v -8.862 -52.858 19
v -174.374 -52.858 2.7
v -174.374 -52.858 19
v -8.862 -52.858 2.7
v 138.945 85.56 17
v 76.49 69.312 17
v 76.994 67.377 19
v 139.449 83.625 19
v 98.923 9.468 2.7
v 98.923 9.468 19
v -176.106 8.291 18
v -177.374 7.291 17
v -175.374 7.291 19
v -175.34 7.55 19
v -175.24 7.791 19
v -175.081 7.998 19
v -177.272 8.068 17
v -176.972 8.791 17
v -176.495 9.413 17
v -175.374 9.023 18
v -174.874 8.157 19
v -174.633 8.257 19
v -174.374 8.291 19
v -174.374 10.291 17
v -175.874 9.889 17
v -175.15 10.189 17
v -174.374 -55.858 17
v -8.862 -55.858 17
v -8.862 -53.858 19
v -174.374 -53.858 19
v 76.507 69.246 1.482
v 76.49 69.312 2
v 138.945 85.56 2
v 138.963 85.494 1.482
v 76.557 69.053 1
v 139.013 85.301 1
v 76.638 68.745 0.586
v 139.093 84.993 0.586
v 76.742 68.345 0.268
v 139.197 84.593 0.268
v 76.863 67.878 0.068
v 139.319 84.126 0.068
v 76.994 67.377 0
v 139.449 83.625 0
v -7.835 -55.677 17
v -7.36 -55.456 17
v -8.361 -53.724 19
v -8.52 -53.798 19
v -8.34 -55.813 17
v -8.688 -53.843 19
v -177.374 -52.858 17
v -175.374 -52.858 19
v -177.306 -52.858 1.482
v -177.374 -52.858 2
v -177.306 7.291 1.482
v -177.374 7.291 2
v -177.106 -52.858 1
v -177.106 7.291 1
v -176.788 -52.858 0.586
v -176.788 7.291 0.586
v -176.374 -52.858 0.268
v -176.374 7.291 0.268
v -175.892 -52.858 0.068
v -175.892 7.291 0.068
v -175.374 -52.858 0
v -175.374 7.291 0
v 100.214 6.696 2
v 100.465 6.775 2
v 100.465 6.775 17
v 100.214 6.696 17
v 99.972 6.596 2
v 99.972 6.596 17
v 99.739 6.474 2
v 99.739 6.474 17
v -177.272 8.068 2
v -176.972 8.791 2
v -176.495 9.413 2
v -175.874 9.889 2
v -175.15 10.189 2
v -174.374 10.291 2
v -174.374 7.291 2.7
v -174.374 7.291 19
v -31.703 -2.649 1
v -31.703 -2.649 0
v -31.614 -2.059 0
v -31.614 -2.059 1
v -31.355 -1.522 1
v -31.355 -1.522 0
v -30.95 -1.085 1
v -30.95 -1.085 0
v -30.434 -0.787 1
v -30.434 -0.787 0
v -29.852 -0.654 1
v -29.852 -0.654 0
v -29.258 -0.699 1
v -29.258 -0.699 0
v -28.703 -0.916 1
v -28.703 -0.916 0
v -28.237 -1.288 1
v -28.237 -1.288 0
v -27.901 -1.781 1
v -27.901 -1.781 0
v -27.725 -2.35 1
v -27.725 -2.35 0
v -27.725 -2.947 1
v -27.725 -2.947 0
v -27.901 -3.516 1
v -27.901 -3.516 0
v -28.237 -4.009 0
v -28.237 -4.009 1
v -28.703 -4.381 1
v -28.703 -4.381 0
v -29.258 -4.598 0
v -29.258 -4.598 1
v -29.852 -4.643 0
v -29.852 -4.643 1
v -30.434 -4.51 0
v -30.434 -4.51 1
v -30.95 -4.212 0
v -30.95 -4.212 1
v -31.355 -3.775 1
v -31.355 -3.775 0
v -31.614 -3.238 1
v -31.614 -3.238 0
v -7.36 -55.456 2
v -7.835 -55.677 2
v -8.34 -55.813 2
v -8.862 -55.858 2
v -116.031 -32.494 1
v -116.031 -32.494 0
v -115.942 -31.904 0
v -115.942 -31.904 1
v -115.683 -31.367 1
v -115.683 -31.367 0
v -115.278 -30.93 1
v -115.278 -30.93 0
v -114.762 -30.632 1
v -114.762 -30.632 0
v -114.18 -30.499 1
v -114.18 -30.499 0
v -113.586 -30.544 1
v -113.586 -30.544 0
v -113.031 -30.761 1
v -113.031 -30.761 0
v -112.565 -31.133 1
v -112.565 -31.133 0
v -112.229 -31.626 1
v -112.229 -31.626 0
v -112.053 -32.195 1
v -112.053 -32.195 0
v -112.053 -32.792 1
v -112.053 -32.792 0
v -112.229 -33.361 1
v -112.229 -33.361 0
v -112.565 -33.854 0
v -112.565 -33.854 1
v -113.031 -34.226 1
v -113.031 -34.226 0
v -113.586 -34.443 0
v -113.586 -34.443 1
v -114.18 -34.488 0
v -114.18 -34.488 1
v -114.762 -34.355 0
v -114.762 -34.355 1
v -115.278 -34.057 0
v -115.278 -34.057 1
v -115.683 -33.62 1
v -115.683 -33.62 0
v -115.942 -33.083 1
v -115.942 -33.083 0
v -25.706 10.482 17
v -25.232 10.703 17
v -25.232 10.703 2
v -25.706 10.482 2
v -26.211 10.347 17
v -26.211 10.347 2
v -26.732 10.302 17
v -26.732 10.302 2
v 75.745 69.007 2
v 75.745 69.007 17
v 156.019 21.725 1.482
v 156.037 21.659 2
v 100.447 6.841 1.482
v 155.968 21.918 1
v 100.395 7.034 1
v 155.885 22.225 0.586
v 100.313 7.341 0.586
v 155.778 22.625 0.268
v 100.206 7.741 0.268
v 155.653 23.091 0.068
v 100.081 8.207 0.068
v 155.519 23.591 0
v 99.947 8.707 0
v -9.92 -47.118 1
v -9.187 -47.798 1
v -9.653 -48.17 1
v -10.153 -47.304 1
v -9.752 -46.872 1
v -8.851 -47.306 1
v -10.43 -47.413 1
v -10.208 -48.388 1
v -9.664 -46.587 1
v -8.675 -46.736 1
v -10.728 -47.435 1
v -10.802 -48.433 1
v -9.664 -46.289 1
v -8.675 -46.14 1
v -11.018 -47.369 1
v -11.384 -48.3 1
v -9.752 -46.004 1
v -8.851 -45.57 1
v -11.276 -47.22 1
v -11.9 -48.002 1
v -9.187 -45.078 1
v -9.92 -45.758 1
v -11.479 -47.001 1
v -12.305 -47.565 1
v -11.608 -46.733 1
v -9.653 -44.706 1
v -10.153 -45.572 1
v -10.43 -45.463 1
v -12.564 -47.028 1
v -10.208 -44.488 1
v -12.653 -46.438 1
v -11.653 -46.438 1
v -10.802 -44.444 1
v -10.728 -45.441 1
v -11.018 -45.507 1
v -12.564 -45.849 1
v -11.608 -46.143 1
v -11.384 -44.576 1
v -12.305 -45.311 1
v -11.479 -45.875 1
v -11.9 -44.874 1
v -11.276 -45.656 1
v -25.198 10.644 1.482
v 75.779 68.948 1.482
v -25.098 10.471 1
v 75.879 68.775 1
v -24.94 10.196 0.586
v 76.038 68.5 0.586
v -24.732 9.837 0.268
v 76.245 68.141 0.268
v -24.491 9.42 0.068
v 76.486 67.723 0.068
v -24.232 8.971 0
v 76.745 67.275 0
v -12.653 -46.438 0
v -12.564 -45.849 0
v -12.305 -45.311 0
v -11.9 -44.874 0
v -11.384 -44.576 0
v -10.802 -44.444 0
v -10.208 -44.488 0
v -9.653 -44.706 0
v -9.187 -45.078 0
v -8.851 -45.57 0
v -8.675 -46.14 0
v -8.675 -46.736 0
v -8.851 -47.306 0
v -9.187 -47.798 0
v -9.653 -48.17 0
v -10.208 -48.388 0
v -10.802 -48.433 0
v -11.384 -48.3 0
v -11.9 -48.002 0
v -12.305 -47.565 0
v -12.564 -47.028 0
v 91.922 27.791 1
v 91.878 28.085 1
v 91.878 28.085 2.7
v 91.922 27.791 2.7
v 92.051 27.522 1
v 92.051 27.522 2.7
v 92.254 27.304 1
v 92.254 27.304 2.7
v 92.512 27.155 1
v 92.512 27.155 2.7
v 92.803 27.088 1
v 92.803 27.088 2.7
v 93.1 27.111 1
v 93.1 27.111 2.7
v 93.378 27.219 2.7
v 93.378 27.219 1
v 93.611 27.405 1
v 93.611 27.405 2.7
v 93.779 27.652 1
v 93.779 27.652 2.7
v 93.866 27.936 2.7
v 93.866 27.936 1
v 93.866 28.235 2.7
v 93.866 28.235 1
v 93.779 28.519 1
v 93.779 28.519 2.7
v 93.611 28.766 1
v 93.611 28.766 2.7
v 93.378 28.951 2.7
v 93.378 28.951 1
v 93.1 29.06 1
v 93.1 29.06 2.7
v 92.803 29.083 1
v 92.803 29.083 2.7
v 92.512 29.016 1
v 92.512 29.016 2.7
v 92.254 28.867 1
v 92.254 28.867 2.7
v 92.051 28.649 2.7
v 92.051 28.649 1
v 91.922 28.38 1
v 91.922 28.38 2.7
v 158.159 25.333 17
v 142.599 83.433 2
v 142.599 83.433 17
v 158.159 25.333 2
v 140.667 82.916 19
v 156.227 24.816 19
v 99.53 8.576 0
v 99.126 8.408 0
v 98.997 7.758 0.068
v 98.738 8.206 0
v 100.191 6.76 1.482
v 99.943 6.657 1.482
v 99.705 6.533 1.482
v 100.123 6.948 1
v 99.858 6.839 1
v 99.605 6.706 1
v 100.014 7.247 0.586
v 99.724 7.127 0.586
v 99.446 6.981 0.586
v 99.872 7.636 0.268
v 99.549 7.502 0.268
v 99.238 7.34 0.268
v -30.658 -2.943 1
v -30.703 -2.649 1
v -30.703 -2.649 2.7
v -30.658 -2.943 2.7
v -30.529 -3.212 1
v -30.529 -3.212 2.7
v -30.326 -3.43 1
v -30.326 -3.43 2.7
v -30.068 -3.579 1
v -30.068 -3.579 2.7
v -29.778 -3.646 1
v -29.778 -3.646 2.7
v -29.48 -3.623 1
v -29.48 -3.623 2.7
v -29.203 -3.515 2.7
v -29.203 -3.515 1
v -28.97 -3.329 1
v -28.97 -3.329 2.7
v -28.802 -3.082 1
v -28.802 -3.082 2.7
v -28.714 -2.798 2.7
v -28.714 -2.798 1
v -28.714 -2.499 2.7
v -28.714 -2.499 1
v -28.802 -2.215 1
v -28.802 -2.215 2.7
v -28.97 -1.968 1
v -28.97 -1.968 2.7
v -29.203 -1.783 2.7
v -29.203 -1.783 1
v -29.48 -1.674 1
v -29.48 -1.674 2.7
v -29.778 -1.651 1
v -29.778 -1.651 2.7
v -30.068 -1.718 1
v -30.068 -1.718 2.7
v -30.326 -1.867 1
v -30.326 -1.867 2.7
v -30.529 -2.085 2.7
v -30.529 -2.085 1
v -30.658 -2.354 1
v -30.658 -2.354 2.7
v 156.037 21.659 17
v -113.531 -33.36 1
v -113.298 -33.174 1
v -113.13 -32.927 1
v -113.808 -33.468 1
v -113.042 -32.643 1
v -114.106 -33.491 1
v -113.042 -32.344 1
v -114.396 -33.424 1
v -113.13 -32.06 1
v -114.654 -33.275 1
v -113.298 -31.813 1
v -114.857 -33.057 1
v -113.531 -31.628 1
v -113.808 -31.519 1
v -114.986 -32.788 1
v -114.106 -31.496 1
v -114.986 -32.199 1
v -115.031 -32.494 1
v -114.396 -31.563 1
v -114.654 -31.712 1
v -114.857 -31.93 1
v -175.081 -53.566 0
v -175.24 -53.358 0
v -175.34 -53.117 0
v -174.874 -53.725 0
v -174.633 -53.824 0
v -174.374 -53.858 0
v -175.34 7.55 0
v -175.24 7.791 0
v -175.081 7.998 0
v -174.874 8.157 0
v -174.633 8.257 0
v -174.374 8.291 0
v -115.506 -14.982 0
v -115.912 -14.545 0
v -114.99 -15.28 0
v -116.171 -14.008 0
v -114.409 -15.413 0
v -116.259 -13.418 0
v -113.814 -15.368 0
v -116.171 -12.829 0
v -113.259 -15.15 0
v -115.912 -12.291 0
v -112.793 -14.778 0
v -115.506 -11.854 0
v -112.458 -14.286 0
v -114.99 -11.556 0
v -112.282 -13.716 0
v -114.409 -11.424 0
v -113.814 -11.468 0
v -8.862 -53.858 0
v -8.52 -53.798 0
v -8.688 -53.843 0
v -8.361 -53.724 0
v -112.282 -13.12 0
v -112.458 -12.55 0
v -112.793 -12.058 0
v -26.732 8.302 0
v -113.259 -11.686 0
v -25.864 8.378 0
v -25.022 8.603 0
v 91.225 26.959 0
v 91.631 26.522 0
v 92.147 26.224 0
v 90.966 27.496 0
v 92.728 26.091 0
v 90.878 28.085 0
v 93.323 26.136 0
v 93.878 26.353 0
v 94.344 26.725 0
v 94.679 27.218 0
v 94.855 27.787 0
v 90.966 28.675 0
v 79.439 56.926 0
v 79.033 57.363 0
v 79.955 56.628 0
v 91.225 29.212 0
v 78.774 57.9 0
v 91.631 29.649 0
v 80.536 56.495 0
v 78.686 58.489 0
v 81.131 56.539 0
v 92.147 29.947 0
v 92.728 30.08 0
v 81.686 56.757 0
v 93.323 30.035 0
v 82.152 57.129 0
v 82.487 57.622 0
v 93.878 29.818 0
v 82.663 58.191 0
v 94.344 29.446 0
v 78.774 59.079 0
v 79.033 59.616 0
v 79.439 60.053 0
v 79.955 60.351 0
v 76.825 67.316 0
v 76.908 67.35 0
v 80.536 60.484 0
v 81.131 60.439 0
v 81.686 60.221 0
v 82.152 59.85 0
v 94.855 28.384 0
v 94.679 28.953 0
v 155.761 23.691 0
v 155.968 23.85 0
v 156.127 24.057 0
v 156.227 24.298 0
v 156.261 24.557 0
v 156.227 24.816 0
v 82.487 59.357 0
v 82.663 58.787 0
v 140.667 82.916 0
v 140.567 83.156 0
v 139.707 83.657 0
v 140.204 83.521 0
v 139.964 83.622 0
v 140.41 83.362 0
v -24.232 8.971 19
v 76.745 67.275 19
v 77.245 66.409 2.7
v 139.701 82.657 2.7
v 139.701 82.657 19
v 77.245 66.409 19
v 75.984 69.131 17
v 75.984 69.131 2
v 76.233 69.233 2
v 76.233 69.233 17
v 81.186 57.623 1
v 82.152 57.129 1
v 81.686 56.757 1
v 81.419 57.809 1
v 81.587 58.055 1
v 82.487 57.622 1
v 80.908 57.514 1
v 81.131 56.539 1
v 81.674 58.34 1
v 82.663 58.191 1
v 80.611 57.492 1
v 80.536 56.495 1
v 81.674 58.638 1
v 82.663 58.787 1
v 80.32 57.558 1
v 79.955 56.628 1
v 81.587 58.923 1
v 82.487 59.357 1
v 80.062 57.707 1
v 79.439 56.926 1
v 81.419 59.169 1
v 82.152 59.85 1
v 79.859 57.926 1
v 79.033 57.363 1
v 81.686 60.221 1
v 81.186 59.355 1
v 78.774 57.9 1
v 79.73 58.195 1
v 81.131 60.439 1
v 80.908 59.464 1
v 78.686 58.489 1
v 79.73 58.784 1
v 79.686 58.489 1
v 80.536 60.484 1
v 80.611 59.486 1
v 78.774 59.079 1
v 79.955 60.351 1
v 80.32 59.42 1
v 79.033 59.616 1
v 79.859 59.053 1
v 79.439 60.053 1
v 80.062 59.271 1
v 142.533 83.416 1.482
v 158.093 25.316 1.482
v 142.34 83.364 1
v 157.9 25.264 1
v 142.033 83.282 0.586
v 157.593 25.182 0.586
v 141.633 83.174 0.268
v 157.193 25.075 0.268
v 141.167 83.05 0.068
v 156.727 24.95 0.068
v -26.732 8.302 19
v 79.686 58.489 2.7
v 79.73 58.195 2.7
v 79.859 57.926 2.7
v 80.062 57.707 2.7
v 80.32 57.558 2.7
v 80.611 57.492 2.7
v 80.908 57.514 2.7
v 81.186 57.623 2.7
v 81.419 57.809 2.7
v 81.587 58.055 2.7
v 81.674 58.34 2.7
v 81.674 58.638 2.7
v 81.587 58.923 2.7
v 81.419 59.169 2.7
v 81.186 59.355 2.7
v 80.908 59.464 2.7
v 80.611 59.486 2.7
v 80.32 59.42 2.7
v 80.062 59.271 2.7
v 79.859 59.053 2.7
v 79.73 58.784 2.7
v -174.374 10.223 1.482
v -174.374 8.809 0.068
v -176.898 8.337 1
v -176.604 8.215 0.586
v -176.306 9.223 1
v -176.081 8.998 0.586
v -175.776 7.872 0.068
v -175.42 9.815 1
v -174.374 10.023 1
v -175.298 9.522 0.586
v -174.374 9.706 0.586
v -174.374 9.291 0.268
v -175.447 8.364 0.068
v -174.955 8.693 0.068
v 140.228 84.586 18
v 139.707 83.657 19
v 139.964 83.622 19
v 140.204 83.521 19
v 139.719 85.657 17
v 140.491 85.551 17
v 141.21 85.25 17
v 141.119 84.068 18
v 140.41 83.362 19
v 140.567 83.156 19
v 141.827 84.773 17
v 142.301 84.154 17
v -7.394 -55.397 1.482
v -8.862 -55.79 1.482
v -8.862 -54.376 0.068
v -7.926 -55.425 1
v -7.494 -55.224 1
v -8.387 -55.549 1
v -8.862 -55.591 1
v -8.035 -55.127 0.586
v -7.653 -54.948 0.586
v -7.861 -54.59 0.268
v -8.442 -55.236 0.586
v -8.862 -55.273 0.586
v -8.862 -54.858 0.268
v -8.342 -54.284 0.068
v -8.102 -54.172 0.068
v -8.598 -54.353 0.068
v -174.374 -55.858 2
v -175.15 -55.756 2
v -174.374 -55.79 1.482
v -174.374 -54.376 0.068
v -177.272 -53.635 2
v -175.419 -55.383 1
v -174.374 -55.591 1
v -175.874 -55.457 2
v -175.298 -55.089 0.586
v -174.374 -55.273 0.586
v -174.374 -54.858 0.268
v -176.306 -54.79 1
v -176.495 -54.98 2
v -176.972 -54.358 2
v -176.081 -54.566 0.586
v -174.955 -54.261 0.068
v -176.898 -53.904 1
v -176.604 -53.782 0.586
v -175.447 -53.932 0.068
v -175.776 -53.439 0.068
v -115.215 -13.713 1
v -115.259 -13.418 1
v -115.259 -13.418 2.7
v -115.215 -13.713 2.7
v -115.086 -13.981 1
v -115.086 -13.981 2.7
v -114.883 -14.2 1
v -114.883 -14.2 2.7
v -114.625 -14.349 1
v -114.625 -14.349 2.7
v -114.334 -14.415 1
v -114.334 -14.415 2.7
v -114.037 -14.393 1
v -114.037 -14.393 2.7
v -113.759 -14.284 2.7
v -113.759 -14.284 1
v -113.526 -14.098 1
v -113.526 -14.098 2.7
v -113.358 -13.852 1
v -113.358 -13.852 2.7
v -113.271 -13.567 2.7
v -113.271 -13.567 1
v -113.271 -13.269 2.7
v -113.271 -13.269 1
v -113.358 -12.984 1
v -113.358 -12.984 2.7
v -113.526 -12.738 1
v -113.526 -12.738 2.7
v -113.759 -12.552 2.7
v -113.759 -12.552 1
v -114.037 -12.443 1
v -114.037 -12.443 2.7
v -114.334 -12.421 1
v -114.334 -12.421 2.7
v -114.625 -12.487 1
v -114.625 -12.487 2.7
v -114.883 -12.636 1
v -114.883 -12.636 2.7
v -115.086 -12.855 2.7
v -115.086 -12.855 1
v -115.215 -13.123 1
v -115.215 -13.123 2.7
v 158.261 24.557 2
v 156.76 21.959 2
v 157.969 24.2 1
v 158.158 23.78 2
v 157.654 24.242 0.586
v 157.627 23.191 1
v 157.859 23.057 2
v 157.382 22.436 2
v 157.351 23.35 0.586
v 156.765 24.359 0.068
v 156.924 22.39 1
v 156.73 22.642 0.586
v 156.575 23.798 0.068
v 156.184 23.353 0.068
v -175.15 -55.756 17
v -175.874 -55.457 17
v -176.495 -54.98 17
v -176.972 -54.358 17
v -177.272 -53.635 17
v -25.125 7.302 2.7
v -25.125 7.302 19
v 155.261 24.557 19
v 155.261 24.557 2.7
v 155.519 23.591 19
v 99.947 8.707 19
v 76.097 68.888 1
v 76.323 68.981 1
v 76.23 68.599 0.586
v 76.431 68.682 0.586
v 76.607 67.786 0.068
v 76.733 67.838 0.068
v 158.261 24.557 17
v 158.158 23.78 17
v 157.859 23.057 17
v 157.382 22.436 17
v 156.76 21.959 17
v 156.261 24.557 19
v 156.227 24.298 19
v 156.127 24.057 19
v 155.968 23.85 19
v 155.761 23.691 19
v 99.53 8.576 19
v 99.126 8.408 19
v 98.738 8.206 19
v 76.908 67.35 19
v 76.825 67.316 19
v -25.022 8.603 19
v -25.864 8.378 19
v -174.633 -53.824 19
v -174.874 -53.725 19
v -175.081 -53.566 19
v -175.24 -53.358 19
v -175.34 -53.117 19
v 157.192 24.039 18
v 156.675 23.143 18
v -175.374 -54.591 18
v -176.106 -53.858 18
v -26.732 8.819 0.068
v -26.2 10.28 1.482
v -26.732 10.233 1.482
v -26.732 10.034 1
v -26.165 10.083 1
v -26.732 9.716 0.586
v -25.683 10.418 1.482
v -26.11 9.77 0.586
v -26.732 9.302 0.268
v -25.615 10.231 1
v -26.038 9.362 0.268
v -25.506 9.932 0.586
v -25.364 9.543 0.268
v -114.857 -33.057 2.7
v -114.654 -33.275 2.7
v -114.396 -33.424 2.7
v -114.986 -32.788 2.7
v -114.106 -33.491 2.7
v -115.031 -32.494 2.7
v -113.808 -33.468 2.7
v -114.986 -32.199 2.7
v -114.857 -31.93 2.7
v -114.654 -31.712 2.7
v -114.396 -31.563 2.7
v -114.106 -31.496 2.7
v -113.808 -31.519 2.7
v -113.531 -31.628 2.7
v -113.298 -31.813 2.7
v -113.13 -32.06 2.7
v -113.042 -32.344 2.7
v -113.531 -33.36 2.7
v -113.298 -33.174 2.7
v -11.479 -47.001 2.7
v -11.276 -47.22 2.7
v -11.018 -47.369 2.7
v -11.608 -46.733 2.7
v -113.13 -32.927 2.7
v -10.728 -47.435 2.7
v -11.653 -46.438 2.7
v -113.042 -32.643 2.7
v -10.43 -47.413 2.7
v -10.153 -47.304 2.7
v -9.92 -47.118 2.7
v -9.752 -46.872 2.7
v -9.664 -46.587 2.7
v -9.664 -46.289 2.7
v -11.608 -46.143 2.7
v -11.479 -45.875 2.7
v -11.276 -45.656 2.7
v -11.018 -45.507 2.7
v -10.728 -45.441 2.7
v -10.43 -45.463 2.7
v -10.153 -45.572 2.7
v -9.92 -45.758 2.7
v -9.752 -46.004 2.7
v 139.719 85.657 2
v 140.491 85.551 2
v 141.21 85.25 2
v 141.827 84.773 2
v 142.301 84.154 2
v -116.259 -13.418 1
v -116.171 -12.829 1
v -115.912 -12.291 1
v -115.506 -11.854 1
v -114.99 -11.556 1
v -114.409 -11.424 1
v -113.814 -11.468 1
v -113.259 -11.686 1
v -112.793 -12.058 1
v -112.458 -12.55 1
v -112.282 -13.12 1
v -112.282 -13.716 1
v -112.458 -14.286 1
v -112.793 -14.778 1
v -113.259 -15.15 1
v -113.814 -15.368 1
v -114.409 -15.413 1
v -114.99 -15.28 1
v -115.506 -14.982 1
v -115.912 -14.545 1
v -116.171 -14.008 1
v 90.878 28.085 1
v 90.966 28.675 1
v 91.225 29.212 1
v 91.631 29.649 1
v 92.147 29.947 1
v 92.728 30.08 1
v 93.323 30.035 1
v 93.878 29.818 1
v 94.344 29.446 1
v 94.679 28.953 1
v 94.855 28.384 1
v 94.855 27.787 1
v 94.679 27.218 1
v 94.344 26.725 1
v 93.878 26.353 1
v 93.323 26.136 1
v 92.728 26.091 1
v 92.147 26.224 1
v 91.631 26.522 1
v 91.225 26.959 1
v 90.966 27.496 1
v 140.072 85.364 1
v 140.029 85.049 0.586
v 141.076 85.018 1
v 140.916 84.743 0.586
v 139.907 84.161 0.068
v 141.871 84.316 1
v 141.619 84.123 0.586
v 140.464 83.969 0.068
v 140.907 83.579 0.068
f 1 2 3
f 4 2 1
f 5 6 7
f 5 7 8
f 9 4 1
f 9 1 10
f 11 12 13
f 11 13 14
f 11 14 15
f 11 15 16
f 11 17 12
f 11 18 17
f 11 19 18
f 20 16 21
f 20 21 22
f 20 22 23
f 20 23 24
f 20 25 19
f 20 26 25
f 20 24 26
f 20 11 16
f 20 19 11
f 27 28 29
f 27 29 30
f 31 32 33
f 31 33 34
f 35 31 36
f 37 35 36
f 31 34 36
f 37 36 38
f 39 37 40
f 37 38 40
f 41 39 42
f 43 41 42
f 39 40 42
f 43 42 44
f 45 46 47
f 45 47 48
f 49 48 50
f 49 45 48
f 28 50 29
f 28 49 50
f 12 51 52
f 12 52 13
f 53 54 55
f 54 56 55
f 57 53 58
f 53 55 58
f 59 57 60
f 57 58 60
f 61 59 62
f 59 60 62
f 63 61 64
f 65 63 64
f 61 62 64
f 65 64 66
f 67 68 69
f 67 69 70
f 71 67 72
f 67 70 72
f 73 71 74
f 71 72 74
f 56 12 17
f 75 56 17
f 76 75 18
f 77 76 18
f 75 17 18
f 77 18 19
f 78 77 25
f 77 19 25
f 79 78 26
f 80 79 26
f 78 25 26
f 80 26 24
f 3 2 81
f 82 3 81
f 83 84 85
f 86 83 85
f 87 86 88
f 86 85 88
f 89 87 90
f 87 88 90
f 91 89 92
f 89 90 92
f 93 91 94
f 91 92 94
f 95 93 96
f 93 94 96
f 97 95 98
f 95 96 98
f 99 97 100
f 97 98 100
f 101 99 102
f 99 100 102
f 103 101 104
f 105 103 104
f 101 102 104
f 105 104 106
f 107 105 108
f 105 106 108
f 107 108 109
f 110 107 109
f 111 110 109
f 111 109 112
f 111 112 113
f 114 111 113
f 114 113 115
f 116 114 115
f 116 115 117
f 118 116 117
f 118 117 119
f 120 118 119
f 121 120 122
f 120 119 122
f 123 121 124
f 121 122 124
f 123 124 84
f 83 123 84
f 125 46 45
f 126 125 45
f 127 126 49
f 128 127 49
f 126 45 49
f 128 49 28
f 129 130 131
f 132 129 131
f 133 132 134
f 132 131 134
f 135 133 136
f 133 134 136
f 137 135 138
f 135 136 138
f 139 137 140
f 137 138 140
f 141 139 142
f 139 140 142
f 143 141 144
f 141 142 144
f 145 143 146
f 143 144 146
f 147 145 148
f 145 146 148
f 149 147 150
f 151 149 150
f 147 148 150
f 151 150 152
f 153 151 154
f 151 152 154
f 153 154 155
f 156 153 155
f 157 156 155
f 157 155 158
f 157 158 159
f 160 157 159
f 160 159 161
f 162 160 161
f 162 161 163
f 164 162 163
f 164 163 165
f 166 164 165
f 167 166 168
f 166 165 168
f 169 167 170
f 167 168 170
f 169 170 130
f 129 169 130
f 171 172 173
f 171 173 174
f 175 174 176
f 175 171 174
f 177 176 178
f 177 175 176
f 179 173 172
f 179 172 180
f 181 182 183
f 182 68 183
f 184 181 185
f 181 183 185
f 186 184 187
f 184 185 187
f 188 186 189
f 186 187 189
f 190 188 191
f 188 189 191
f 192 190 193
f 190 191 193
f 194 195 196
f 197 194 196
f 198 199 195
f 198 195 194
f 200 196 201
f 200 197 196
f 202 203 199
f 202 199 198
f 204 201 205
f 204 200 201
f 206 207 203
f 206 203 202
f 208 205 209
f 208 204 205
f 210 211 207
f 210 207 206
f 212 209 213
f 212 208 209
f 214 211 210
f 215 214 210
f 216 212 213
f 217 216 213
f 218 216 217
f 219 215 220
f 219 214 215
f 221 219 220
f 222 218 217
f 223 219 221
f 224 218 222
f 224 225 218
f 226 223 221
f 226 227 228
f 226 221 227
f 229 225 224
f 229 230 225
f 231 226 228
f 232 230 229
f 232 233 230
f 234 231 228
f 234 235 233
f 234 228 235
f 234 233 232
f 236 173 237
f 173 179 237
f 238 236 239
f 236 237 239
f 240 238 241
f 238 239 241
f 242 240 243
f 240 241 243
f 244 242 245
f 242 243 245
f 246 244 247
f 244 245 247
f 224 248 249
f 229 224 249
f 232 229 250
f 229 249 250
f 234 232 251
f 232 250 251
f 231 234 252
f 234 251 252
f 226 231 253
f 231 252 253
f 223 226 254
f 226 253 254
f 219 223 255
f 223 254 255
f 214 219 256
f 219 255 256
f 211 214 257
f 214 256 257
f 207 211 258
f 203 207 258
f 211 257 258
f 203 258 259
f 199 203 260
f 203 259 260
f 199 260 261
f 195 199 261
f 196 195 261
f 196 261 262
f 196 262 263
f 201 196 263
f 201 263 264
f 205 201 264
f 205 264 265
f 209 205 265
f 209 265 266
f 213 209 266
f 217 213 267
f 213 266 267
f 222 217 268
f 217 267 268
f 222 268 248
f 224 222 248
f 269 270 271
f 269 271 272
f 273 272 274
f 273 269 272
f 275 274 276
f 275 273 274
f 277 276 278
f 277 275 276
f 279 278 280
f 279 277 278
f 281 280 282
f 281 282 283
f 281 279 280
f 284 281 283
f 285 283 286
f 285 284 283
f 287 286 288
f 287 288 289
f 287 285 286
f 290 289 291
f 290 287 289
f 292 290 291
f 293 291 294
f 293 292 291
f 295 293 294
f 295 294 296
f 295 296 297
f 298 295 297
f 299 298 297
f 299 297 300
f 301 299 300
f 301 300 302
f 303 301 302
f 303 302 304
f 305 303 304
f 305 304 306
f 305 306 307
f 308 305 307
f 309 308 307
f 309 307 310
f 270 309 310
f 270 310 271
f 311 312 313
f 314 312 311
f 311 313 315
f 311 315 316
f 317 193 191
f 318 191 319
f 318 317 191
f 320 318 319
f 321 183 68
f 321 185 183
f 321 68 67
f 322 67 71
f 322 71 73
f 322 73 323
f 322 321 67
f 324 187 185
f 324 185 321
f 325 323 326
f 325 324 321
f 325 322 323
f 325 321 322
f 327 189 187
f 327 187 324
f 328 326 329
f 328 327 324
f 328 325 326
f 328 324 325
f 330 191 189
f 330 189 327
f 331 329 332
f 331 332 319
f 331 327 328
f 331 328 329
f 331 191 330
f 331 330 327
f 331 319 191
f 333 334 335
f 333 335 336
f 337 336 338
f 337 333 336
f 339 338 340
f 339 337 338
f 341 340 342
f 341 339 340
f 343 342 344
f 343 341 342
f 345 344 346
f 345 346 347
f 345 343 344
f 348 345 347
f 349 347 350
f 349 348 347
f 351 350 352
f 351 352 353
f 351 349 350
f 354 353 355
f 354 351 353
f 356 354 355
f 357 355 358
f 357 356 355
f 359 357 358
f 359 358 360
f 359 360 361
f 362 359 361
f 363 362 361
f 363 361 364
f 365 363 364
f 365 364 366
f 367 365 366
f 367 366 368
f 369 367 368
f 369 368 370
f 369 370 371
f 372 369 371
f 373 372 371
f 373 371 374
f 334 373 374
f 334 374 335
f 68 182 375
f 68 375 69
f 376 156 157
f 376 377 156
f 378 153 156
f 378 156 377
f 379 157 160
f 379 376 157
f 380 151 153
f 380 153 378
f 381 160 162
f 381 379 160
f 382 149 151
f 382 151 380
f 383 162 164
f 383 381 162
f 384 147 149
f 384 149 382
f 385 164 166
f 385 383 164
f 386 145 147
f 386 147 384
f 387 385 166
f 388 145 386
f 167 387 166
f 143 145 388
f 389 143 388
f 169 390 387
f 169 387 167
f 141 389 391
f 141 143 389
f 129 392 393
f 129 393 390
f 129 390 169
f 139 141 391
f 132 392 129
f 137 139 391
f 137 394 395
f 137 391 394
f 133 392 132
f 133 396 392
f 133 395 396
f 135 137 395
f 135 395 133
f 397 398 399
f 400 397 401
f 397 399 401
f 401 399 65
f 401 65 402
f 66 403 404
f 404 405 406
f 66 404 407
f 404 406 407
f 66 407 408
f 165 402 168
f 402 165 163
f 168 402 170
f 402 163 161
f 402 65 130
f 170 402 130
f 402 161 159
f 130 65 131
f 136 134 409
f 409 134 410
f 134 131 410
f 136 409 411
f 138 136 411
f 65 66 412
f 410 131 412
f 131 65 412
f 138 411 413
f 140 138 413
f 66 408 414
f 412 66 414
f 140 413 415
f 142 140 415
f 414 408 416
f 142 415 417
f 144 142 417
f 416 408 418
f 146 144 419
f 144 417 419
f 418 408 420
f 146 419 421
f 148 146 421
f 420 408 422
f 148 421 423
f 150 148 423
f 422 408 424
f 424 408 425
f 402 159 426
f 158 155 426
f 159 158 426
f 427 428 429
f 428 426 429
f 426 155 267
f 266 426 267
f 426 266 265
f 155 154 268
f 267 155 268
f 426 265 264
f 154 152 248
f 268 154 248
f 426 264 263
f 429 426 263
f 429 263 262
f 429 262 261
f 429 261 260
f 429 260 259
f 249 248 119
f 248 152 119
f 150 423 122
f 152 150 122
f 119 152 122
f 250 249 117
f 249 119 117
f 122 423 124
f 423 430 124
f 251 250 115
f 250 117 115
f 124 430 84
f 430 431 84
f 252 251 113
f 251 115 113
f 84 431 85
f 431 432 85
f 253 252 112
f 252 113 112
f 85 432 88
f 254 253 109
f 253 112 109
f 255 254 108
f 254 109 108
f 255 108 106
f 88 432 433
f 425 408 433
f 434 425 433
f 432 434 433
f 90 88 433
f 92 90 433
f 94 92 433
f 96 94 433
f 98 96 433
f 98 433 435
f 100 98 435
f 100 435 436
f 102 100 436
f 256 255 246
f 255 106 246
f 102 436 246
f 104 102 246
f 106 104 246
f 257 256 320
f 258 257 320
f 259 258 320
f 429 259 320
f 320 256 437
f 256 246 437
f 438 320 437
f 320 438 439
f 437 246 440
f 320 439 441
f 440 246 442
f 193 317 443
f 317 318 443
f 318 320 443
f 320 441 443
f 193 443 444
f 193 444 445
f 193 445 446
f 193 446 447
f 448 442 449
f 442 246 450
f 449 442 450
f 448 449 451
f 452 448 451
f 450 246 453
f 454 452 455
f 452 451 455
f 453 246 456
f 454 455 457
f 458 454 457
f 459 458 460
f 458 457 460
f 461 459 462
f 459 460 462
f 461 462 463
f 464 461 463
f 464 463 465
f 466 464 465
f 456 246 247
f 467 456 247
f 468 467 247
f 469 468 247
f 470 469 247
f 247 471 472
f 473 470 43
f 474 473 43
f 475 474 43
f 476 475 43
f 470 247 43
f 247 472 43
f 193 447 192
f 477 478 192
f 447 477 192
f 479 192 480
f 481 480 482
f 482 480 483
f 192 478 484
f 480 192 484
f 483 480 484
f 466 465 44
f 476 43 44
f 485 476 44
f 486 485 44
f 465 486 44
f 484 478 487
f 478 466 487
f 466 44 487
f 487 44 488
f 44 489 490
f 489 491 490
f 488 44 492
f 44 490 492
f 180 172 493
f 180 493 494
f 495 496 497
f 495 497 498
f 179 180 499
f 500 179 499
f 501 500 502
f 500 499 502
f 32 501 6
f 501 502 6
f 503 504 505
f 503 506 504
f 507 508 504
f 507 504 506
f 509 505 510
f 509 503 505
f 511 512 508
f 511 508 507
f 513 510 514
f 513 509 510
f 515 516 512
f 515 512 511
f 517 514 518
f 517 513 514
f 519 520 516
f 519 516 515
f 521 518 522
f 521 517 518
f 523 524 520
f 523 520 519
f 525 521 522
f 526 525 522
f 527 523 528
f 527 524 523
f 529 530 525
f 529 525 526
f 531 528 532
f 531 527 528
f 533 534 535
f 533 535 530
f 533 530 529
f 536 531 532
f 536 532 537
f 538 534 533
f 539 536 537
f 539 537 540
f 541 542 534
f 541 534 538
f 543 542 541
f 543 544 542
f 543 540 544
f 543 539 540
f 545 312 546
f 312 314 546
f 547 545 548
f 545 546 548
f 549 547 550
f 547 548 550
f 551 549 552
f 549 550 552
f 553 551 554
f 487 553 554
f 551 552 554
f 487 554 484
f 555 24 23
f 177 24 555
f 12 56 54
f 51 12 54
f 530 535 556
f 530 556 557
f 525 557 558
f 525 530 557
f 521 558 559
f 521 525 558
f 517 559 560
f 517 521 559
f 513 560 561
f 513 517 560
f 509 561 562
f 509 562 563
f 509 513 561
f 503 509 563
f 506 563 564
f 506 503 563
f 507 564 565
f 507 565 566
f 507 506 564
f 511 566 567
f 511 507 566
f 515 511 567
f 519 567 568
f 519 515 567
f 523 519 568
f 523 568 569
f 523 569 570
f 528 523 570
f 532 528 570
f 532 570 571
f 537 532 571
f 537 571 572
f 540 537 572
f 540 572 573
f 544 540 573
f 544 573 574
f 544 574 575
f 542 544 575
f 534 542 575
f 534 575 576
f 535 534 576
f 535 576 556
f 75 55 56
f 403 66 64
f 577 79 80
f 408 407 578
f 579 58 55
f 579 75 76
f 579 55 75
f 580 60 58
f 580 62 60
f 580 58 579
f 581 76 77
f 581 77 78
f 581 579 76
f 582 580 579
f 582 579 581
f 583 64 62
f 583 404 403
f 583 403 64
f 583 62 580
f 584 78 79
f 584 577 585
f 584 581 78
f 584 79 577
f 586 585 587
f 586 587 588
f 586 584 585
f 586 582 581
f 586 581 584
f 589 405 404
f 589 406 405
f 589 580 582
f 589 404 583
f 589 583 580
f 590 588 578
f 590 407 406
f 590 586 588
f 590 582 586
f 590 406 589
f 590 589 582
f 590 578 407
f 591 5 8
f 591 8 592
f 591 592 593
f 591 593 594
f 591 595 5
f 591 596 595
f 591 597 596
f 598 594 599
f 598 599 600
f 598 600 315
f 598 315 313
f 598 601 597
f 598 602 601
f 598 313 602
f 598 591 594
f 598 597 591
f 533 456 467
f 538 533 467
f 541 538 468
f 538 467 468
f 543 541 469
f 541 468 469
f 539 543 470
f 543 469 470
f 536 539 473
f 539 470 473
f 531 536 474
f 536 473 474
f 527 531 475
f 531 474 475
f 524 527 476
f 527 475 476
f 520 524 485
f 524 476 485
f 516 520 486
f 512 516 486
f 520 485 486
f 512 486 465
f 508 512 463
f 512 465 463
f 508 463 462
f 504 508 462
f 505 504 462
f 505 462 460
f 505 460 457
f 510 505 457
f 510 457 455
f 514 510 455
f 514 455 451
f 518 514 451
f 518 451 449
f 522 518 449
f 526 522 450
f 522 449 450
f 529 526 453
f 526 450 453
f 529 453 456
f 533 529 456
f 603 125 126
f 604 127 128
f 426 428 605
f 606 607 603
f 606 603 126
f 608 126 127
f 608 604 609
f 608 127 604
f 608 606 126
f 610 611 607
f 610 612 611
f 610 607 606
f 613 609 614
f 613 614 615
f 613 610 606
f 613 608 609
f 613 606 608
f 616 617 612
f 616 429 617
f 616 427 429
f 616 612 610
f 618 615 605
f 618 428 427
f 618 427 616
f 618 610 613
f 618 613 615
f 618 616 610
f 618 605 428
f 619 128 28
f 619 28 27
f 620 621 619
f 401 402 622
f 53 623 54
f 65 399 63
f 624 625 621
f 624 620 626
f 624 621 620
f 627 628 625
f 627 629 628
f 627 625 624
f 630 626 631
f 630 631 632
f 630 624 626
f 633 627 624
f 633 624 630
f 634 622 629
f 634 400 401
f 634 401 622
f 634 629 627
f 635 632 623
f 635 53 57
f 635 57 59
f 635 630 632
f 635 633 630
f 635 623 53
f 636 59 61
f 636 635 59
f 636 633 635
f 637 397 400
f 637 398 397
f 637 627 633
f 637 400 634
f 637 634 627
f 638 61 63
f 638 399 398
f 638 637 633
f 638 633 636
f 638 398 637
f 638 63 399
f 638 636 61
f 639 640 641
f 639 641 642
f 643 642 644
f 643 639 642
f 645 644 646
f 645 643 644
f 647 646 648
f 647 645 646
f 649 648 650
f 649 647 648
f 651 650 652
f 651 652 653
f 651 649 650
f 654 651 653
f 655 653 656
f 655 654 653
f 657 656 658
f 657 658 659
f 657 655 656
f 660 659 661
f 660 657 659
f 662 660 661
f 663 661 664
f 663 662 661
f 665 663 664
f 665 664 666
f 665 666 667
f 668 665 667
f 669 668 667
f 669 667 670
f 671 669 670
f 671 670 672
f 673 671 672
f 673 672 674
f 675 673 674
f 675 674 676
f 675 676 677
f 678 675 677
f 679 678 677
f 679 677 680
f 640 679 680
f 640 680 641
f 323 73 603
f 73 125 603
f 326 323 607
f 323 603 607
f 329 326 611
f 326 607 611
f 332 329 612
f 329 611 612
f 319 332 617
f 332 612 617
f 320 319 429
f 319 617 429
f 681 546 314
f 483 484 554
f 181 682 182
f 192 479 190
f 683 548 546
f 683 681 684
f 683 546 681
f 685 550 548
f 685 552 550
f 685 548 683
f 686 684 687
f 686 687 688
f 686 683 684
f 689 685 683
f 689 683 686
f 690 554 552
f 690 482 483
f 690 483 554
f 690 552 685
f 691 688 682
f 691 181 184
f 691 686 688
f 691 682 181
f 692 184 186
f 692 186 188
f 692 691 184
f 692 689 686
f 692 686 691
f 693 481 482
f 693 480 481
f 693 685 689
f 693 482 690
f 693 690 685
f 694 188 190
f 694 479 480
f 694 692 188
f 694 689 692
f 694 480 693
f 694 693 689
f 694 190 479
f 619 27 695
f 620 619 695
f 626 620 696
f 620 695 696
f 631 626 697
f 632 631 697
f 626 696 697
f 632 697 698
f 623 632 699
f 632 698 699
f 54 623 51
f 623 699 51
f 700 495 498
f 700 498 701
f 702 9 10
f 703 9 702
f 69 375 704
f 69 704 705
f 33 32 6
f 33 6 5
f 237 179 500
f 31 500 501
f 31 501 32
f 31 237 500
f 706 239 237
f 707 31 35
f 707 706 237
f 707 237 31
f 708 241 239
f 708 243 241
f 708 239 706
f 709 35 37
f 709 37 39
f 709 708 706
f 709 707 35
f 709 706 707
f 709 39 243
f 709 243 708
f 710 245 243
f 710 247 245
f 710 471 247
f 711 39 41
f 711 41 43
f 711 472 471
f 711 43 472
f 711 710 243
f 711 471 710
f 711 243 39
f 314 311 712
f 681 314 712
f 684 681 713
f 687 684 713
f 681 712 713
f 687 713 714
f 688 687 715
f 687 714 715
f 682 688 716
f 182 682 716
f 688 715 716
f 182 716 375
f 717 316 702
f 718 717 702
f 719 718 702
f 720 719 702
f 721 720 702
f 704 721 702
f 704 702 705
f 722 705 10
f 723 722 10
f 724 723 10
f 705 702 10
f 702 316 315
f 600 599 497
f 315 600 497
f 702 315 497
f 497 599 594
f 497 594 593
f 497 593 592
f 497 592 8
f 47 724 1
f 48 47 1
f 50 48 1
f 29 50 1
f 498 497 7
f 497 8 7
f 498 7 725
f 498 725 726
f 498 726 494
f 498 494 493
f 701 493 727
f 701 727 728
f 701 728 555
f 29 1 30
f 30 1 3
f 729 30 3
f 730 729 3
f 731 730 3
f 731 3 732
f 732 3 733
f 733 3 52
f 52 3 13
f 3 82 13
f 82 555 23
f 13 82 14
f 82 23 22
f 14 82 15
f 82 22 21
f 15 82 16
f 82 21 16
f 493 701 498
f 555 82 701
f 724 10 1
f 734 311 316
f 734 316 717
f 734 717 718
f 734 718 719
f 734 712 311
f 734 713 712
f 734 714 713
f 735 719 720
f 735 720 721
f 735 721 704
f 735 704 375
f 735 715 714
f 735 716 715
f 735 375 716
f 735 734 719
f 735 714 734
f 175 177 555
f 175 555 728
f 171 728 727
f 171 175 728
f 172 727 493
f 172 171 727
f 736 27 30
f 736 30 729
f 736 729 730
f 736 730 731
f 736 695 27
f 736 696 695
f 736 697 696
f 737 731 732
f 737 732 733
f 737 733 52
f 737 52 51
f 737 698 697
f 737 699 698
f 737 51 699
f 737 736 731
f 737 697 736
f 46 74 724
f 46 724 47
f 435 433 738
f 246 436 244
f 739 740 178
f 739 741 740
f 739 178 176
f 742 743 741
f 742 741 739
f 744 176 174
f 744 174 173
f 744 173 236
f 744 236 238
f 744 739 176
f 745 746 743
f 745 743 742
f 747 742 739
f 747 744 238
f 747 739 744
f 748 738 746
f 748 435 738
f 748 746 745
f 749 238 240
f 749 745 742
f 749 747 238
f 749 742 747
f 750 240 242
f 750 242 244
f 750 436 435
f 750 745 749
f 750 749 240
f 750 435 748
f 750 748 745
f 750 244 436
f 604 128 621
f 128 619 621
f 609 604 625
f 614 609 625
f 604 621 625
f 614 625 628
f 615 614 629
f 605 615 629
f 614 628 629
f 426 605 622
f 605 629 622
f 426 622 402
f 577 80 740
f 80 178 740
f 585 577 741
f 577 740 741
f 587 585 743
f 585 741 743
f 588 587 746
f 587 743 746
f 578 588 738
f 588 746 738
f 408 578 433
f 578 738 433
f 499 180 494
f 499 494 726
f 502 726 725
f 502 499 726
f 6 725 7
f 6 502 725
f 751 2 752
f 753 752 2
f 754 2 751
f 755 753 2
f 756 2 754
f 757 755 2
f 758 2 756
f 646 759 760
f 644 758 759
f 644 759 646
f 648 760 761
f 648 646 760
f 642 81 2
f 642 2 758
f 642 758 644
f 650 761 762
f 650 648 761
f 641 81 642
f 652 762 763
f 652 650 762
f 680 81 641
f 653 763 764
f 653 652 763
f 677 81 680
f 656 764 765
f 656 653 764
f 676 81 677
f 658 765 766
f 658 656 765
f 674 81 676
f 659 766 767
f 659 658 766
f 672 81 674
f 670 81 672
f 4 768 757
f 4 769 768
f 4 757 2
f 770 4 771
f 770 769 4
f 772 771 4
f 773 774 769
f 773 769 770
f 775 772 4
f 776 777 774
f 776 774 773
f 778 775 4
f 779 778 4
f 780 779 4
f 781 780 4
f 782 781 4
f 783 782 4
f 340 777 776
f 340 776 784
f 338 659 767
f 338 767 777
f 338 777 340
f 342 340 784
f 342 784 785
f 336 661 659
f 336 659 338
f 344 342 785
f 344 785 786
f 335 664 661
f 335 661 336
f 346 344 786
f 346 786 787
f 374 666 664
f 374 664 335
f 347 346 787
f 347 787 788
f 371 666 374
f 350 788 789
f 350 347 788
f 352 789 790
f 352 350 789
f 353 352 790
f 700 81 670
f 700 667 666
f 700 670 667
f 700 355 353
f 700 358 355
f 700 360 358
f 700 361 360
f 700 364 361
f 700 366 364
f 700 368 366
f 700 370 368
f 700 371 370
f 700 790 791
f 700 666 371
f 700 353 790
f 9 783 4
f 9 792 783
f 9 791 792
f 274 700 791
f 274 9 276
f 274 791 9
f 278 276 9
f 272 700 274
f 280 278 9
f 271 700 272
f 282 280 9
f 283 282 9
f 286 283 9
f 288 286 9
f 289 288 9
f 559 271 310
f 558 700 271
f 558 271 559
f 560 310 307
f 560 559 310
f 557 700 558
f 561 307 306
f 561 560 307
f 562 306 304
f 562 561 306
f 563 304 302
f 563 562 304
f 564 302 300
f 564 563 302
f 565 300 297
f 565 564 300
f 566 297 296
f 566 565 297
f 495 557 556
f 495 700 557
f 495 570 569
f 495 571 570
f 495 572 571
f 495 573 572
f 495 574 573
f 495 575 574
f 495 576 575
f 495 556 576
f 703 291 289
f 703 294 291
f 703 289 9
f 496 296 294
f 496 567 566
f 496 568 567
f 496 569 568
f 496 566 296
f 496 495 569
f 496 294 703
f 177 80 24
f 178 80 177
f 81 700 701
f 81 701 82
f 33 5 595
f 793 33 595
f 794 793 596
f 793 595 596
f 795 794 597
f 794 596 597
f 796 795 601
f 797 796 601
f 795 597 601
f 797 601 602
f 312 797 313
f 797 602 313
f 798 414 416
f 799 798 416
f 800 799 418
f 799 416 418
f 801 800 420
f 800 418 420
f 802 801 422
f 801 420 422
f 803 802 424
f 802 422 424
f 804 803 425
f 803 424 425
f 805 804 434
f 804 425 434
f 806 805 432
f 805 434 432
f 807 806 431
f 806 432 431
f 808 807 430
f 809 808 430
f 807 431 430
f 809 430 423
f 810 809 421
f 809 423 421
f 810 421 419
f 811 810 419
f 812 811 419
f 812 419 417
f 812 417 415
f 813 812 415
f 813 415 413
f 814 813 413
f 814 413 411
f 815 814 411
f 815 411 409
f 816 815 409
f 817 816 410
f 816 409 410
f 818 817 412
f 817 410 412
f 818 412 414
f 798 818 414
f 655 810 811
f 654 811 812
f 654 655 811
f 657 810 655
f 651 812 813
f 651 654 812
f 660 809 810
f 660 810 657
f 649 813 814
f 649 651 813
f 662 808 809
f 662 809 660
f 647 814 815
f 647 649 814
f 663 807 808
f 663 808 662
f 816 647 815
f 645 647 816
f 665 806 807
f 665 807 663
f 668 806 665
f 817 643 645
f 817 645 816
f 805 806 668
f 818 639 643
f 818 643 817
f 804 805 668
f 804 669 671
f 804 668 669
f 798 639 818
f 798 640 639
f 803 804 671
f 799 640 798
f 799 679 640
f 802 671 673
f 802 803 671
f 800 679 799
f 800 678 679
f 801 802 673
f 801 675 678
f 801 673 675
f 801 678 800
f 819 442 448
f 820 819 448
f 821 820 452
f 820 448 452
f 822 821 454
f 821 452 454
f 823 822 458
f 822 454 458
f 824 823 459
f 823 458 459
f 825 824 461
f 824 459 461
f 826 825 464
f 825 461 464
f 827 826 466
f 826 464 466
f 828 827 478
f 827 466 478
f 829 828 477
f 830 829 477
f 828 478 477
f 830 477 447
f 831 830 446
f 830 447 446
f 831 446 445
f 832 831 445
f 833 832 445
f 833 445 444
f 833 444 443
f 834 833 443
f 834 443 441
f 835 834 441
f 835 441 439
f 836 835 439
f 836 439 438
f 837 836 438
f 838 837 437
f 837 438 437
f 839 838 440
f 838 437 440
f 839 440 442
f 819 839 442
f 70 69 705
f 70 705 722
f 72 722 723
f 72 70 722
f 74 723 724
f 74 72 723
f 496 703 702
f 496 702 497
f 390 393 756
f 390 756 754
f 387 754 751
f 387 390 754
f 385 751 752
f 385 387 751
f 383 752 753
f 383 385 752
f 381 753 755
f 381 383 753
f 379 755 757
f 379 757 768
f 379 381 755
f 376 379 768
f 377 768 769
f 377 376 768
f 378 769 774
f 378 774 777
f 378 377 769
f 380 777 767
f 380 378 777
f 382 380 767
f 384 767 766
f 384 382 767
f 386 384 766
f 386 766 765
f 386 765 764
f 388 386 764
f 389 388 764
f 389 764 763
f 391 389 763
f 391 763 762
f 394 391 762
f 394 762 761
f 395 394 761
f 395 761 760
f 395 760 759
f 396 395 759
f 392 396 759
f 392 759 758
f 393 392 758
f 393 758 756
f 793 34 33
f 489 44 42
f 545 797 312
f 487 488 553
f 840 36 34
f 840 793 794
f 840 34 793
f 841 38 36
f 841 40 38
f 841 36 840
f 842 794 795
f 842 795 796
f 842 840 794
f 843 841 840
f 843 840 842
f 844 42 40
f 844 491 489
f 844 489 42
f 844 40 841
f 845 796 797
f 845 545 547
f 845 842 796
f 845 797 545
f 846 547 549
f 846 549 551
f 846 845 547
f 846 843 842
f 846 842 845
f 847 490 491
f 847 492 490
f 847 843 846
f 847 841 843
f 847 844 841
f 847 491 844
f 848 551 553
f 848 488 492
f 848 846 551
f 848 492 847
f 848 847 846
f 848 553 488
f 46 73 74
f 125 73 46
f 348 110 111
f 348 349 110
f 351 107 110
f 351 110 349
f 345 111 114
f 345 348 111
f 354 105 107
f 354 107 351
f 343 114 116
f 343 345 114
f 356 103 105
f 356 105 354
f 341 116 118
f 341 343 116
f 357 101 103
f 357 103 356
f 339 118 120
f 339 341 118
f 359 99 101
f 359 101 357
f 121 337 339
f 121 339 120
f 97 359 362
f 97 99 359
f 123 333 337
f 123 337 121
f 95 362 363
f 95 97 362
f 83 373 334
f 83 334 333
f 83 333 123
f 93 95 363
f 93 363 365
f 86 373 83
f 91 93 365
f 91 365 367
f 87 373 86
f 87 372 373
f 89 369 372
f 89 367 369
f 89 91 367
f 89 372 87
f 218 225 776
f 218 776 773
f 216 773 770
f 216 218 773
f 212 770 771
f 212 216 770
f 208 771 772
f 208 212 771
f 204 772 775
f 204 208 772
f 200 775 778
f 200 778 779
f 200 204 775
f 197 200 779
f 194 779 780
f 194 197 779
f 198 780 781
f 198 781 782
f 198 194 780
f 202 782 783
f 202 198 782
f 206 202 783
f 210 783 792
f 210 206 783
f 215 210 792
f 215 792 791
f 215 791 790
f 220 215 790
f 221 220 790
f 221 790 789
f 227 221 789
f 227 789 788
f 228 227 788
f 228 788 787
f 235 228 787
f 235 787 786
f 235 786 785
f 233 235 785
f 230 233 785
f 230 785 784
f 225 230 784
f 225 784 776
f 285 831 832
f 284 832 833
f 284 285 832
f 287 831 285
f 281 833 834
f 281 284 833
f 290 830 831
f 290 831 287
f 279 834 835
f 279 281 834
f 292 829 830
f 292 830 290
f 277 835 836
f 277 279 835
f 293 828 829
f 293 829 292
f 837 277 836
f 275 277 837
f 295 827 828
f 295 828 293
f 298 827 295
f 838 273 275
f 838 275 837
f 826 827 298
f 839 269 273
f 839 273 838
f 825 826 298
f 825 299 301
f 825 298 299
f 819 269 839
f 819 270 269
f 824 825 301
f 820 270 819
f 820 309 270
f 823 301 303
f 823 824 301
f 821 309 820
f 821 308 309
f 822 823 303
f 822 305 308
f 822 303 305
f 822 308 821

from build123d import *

# Parameters (mm, degrees)
BOSS_EXTRU_1_DEPTH      = 19
CONG_1_R                = 3
ESQUISSE1_R             = 1
BOSS_EXTRU_2_DEPTH      = 2.7
ESQUISSE2_R             = 2
ESQUISSE2_R_2           = 1
ENL_V_MAT_EXTRU_1_DEPTH = 1
CHANFREIN1_SIZE         = 2
CONG_2_R                = 2


with BuildPart() as part:
    # Model → Boss.-Extru.1 (new body)
    with BuildSketch(Plane.XY):
        Polygon((-25.928539703, 10.301582208), (76.096991945, 69.210096437), (141.828136311, 86.310332452), (158.934643692, 22.435471273), (100.081941761, 6.672683012), (-8.057042666, -55.858487698), (-177.373873722, -55.858487698), (-177.373873722, -50.687645053), (-177.373873722, 10.291172324), align=None)
        Polygon((-25.124548608, 7.301637465), (-174.373873722, 7.291378528), (-174.373873722, -50.687645053), (-174.373873722, -52.858487698), (-8.861972593, -52.858487698), (98.923133978, 9.468053786), (155.26069475, 24.557200291), (139.700811798, 82.657041562), (77.245358051, 66.408990356), align=None, mode=Mode.SUBTRACT)
    extrude(amount=BOSS_EXTRU_1_DEPTH)

    # Congé1
    cong_1_edges = [part.edges().sort_by_distance(p)[0] for p in [
        (76.096991945, 69.210096437, 9.5),
        (141.828136311, 86.310332452, 9.5),
        (158.934643692, 22.435471273, 9.5),
        (100.081941761, 6.672683012, 9.5),
        (-8.057042666, -55.858487698, 9.5),
        (-177.373873722, -55.858487698, 9.5),
        (-177.373873722, 10.291172324, 9.5),
        (-25.928539703, 10.301582208, 9.5),
    ]]
    fillet(cong_1_edges, radius=CONG_1_R)

    # Esquisse1 → Boss.-Extru.2 (add)
    with BuildSketch(Plane.XY):
        Polygon((-25.124548608, 7.301637465), (-174.373873722, 7.291378528), (-174.373873722, -50.687645053), (-174.373873722, -52.858487698), (-8.861972593, -52.858487698), (98.923133978, 9.468053786), (155.26069475, 24.557200291), (139.700811798, 82.657041562), (77.245358051, 66.408990356), align=None)
        with Locations(Location((-114.259444544, -13.418125698, 0), (0, 0, 180))):
            Circle(ESQUISSE1_R, mode=Mode.SUBTRACT)
        with Locations(Location((-114.030844544, -32.493525698, 0), (0, 0, 180))):
            Circle(ESQUISSE1_R, mode=Mode.SUBTRACT)
        with Locations(Location((-29.702844544, -2.648525698, 0), (0, 0, 180))):
            Circle(ESQUISSE1_R, mode=Mode.SUBTRACT)
        with Locations(Location((-10.652844544, -46.438125698, 0), (0, 0, 180))):
            Circle(ESQUISSE1_R, mode=Mode.SUBTRACT)
        with Locations(Location((80.685555456, 58.489274302, 0), (0, 0, 180))):
            Circle(ESQUISSE1_R, mode=Mode.SUBTRACT)
        with Locations(Location((92.877555456, 28.085474302, 0), (0, 0, 180))):
            Circle(ESQUISSE1_R, mode=Mode.SUBTRACT)
    extrude(amount=BOSS_EXTRU_2_DEPTH)

    # Esquisse2 → Enlèv. mat.-Extru.1 (cut)
    # profile 1 of 6: a face of its own
    with BuildSketch(Plane(origin=(0, 0, 0), x_dir=(-1, 0, 0), z_dir=(0, 0, -1))):
        with Locations((-80.685555456, 58.489274302)):
            Circle(ESQUISSE2_R)
        with Locations((-80.685555456, 58.489274302)):
            Circle(ESQUISSE2_R_2, mode=Mode.SUBTRACT)
    # profile 2 of 6: a face of its own
    with BuildSketch(Plane(origin=(0, 0, 0), x_dir=(-1, 0, 0), z_dir=(0, 0, -1))):
        with Locations((-92.877555456, 28.085474302)):
            Circle(ESQUISSE2_R)
        with Locations((-92.877555456, 28.085474302)):
            Circle(ESQUISSE2_R_2, mode=Mode.SUBTRACT)
    # profile 3 of 6: a face of its own
    with BuildSketch(Plane(origin=(0, 0, 0), x_dir=(-1, 0, 0), z_dir=(0, 0, -1))):
        with Locations((29.702844544, -2.648525698)):
            Circle(ESQUISSE2_R)
        with Locations((29.702844544, -2.648525698)):
            Circle(ESQUISSE2_R_2, mode=Mode.SUBTRACT)
    # profile 4 of 6: a face of its own
    with BuildSketch(Plane(origin=(0, 0, 0), x_dir=(-1, 0, 0), z_dir=(0, 0, -1))):
        with Locations((10.652844544, -46.438125698)):
            Circle(ESQUISSE2_R)
        with Locations((10.652844544, -46.438125698)):
            Circle(ESQUISSE2_R_2, mode=Mode.SUBTRACT)
    # profile 5 of 6: a face of its own
    with BuildSketch(Plane(origin=(0, 0, 0), x_dir=(-1, 0, 0), z_dir=(0, 0, -1))):
        with Locations((114.259444544, -13.418125698)):
            Circle(ESQUISSE2_R)
        with Locations((114.259444544, -13.418125698)):
            Circle(ESQUISSE2_R_2, mode=Mode.SUBTRACT)
    # profile 6 of 6: a face of its own
    with BuildSketch(Plane(origin=(0, 0, 0), x_dir=(-1, 0, 0), z_dir=(0, 0, -1))):
        with Locations((114.030844544, -32.493525698)):
            Circle(ESQUISSE2_R)
        with Locations((114.030844544, -32.493525698)):
            Circle(ESQUISSE2_R_2, mode=Mode.SUBTRACT)
    extrude(amount=-ENL_V_MAT_EXTRU_1_DEPTH, mode=Mode.SUBTRACT)

    # Chanfrein1
    chanfrein1_edges = [part.edges().sort_by_distance(p)[0] for p in [
        (-100.55320226, 10.296452739, 19),
        (25.256413626, 39.855258654, 19),
        (107.717763914, 77.436374389, 19),
        (-177.373873722, -22.783554585, 19),
        (-91.617923158, -55.858487698, 19),
        (46.189388475, -24.49058773, 19),
        (128.250722147, 14.217256264, 19),
        (150.378629519, 54.383209367, 19),
        (-176.495266971, 9.412625963, 19),
        (-176.495194066, -54.979808041, 19),
        (-8.084540154, -55.756003669, 19),
        (157.858595311, 23.056896097, 19),
        (141.210432656, 85.249539366, 19),
        (76.107372343, 69.184776466, 19),
        (-25.955930978, 10.403787708, 19),
        (100.091914608, 6.648625697, 19),
    ]]
    chamfer(chanfrein1_edges, length=CHANFREIN1_SIZE)

    # Congé2
    cong_2_edges = [part.edges().sort_by_distance(p)[0] for p in [
        (-100.55320226, 10.296452739, 0),
        (25.256413626, 39.855258654, 0),
        (107.717763914, 77.436374389, 0),
        (150.378629519, 54.383209367, 0),
        (128.250722147, 14.217256264, 0),
        (46.189388475, -24.49058773, 0),
        (-91.617923158, -55.858487698, 0),
        (-177.373873722, -22.783554585, 0),
        (-176.495266971, 9.412625963, 0),
        (-176.495194066, -54.979808041, 0),
        (-8.084540154, -55.756003669, 0),
        (157.858595311, 23.056896097, 0),
        (141.210432656, 85.249539366, 0),
        (76.107372343, 69.184776466, 0),
        (-25.955930978, 10.403787708, 0),
        (100.091914608, 6.648625697, 0),
    ]]
    fillet(cong_2_edges, radius=CONG_2_R)


solid = part.part
